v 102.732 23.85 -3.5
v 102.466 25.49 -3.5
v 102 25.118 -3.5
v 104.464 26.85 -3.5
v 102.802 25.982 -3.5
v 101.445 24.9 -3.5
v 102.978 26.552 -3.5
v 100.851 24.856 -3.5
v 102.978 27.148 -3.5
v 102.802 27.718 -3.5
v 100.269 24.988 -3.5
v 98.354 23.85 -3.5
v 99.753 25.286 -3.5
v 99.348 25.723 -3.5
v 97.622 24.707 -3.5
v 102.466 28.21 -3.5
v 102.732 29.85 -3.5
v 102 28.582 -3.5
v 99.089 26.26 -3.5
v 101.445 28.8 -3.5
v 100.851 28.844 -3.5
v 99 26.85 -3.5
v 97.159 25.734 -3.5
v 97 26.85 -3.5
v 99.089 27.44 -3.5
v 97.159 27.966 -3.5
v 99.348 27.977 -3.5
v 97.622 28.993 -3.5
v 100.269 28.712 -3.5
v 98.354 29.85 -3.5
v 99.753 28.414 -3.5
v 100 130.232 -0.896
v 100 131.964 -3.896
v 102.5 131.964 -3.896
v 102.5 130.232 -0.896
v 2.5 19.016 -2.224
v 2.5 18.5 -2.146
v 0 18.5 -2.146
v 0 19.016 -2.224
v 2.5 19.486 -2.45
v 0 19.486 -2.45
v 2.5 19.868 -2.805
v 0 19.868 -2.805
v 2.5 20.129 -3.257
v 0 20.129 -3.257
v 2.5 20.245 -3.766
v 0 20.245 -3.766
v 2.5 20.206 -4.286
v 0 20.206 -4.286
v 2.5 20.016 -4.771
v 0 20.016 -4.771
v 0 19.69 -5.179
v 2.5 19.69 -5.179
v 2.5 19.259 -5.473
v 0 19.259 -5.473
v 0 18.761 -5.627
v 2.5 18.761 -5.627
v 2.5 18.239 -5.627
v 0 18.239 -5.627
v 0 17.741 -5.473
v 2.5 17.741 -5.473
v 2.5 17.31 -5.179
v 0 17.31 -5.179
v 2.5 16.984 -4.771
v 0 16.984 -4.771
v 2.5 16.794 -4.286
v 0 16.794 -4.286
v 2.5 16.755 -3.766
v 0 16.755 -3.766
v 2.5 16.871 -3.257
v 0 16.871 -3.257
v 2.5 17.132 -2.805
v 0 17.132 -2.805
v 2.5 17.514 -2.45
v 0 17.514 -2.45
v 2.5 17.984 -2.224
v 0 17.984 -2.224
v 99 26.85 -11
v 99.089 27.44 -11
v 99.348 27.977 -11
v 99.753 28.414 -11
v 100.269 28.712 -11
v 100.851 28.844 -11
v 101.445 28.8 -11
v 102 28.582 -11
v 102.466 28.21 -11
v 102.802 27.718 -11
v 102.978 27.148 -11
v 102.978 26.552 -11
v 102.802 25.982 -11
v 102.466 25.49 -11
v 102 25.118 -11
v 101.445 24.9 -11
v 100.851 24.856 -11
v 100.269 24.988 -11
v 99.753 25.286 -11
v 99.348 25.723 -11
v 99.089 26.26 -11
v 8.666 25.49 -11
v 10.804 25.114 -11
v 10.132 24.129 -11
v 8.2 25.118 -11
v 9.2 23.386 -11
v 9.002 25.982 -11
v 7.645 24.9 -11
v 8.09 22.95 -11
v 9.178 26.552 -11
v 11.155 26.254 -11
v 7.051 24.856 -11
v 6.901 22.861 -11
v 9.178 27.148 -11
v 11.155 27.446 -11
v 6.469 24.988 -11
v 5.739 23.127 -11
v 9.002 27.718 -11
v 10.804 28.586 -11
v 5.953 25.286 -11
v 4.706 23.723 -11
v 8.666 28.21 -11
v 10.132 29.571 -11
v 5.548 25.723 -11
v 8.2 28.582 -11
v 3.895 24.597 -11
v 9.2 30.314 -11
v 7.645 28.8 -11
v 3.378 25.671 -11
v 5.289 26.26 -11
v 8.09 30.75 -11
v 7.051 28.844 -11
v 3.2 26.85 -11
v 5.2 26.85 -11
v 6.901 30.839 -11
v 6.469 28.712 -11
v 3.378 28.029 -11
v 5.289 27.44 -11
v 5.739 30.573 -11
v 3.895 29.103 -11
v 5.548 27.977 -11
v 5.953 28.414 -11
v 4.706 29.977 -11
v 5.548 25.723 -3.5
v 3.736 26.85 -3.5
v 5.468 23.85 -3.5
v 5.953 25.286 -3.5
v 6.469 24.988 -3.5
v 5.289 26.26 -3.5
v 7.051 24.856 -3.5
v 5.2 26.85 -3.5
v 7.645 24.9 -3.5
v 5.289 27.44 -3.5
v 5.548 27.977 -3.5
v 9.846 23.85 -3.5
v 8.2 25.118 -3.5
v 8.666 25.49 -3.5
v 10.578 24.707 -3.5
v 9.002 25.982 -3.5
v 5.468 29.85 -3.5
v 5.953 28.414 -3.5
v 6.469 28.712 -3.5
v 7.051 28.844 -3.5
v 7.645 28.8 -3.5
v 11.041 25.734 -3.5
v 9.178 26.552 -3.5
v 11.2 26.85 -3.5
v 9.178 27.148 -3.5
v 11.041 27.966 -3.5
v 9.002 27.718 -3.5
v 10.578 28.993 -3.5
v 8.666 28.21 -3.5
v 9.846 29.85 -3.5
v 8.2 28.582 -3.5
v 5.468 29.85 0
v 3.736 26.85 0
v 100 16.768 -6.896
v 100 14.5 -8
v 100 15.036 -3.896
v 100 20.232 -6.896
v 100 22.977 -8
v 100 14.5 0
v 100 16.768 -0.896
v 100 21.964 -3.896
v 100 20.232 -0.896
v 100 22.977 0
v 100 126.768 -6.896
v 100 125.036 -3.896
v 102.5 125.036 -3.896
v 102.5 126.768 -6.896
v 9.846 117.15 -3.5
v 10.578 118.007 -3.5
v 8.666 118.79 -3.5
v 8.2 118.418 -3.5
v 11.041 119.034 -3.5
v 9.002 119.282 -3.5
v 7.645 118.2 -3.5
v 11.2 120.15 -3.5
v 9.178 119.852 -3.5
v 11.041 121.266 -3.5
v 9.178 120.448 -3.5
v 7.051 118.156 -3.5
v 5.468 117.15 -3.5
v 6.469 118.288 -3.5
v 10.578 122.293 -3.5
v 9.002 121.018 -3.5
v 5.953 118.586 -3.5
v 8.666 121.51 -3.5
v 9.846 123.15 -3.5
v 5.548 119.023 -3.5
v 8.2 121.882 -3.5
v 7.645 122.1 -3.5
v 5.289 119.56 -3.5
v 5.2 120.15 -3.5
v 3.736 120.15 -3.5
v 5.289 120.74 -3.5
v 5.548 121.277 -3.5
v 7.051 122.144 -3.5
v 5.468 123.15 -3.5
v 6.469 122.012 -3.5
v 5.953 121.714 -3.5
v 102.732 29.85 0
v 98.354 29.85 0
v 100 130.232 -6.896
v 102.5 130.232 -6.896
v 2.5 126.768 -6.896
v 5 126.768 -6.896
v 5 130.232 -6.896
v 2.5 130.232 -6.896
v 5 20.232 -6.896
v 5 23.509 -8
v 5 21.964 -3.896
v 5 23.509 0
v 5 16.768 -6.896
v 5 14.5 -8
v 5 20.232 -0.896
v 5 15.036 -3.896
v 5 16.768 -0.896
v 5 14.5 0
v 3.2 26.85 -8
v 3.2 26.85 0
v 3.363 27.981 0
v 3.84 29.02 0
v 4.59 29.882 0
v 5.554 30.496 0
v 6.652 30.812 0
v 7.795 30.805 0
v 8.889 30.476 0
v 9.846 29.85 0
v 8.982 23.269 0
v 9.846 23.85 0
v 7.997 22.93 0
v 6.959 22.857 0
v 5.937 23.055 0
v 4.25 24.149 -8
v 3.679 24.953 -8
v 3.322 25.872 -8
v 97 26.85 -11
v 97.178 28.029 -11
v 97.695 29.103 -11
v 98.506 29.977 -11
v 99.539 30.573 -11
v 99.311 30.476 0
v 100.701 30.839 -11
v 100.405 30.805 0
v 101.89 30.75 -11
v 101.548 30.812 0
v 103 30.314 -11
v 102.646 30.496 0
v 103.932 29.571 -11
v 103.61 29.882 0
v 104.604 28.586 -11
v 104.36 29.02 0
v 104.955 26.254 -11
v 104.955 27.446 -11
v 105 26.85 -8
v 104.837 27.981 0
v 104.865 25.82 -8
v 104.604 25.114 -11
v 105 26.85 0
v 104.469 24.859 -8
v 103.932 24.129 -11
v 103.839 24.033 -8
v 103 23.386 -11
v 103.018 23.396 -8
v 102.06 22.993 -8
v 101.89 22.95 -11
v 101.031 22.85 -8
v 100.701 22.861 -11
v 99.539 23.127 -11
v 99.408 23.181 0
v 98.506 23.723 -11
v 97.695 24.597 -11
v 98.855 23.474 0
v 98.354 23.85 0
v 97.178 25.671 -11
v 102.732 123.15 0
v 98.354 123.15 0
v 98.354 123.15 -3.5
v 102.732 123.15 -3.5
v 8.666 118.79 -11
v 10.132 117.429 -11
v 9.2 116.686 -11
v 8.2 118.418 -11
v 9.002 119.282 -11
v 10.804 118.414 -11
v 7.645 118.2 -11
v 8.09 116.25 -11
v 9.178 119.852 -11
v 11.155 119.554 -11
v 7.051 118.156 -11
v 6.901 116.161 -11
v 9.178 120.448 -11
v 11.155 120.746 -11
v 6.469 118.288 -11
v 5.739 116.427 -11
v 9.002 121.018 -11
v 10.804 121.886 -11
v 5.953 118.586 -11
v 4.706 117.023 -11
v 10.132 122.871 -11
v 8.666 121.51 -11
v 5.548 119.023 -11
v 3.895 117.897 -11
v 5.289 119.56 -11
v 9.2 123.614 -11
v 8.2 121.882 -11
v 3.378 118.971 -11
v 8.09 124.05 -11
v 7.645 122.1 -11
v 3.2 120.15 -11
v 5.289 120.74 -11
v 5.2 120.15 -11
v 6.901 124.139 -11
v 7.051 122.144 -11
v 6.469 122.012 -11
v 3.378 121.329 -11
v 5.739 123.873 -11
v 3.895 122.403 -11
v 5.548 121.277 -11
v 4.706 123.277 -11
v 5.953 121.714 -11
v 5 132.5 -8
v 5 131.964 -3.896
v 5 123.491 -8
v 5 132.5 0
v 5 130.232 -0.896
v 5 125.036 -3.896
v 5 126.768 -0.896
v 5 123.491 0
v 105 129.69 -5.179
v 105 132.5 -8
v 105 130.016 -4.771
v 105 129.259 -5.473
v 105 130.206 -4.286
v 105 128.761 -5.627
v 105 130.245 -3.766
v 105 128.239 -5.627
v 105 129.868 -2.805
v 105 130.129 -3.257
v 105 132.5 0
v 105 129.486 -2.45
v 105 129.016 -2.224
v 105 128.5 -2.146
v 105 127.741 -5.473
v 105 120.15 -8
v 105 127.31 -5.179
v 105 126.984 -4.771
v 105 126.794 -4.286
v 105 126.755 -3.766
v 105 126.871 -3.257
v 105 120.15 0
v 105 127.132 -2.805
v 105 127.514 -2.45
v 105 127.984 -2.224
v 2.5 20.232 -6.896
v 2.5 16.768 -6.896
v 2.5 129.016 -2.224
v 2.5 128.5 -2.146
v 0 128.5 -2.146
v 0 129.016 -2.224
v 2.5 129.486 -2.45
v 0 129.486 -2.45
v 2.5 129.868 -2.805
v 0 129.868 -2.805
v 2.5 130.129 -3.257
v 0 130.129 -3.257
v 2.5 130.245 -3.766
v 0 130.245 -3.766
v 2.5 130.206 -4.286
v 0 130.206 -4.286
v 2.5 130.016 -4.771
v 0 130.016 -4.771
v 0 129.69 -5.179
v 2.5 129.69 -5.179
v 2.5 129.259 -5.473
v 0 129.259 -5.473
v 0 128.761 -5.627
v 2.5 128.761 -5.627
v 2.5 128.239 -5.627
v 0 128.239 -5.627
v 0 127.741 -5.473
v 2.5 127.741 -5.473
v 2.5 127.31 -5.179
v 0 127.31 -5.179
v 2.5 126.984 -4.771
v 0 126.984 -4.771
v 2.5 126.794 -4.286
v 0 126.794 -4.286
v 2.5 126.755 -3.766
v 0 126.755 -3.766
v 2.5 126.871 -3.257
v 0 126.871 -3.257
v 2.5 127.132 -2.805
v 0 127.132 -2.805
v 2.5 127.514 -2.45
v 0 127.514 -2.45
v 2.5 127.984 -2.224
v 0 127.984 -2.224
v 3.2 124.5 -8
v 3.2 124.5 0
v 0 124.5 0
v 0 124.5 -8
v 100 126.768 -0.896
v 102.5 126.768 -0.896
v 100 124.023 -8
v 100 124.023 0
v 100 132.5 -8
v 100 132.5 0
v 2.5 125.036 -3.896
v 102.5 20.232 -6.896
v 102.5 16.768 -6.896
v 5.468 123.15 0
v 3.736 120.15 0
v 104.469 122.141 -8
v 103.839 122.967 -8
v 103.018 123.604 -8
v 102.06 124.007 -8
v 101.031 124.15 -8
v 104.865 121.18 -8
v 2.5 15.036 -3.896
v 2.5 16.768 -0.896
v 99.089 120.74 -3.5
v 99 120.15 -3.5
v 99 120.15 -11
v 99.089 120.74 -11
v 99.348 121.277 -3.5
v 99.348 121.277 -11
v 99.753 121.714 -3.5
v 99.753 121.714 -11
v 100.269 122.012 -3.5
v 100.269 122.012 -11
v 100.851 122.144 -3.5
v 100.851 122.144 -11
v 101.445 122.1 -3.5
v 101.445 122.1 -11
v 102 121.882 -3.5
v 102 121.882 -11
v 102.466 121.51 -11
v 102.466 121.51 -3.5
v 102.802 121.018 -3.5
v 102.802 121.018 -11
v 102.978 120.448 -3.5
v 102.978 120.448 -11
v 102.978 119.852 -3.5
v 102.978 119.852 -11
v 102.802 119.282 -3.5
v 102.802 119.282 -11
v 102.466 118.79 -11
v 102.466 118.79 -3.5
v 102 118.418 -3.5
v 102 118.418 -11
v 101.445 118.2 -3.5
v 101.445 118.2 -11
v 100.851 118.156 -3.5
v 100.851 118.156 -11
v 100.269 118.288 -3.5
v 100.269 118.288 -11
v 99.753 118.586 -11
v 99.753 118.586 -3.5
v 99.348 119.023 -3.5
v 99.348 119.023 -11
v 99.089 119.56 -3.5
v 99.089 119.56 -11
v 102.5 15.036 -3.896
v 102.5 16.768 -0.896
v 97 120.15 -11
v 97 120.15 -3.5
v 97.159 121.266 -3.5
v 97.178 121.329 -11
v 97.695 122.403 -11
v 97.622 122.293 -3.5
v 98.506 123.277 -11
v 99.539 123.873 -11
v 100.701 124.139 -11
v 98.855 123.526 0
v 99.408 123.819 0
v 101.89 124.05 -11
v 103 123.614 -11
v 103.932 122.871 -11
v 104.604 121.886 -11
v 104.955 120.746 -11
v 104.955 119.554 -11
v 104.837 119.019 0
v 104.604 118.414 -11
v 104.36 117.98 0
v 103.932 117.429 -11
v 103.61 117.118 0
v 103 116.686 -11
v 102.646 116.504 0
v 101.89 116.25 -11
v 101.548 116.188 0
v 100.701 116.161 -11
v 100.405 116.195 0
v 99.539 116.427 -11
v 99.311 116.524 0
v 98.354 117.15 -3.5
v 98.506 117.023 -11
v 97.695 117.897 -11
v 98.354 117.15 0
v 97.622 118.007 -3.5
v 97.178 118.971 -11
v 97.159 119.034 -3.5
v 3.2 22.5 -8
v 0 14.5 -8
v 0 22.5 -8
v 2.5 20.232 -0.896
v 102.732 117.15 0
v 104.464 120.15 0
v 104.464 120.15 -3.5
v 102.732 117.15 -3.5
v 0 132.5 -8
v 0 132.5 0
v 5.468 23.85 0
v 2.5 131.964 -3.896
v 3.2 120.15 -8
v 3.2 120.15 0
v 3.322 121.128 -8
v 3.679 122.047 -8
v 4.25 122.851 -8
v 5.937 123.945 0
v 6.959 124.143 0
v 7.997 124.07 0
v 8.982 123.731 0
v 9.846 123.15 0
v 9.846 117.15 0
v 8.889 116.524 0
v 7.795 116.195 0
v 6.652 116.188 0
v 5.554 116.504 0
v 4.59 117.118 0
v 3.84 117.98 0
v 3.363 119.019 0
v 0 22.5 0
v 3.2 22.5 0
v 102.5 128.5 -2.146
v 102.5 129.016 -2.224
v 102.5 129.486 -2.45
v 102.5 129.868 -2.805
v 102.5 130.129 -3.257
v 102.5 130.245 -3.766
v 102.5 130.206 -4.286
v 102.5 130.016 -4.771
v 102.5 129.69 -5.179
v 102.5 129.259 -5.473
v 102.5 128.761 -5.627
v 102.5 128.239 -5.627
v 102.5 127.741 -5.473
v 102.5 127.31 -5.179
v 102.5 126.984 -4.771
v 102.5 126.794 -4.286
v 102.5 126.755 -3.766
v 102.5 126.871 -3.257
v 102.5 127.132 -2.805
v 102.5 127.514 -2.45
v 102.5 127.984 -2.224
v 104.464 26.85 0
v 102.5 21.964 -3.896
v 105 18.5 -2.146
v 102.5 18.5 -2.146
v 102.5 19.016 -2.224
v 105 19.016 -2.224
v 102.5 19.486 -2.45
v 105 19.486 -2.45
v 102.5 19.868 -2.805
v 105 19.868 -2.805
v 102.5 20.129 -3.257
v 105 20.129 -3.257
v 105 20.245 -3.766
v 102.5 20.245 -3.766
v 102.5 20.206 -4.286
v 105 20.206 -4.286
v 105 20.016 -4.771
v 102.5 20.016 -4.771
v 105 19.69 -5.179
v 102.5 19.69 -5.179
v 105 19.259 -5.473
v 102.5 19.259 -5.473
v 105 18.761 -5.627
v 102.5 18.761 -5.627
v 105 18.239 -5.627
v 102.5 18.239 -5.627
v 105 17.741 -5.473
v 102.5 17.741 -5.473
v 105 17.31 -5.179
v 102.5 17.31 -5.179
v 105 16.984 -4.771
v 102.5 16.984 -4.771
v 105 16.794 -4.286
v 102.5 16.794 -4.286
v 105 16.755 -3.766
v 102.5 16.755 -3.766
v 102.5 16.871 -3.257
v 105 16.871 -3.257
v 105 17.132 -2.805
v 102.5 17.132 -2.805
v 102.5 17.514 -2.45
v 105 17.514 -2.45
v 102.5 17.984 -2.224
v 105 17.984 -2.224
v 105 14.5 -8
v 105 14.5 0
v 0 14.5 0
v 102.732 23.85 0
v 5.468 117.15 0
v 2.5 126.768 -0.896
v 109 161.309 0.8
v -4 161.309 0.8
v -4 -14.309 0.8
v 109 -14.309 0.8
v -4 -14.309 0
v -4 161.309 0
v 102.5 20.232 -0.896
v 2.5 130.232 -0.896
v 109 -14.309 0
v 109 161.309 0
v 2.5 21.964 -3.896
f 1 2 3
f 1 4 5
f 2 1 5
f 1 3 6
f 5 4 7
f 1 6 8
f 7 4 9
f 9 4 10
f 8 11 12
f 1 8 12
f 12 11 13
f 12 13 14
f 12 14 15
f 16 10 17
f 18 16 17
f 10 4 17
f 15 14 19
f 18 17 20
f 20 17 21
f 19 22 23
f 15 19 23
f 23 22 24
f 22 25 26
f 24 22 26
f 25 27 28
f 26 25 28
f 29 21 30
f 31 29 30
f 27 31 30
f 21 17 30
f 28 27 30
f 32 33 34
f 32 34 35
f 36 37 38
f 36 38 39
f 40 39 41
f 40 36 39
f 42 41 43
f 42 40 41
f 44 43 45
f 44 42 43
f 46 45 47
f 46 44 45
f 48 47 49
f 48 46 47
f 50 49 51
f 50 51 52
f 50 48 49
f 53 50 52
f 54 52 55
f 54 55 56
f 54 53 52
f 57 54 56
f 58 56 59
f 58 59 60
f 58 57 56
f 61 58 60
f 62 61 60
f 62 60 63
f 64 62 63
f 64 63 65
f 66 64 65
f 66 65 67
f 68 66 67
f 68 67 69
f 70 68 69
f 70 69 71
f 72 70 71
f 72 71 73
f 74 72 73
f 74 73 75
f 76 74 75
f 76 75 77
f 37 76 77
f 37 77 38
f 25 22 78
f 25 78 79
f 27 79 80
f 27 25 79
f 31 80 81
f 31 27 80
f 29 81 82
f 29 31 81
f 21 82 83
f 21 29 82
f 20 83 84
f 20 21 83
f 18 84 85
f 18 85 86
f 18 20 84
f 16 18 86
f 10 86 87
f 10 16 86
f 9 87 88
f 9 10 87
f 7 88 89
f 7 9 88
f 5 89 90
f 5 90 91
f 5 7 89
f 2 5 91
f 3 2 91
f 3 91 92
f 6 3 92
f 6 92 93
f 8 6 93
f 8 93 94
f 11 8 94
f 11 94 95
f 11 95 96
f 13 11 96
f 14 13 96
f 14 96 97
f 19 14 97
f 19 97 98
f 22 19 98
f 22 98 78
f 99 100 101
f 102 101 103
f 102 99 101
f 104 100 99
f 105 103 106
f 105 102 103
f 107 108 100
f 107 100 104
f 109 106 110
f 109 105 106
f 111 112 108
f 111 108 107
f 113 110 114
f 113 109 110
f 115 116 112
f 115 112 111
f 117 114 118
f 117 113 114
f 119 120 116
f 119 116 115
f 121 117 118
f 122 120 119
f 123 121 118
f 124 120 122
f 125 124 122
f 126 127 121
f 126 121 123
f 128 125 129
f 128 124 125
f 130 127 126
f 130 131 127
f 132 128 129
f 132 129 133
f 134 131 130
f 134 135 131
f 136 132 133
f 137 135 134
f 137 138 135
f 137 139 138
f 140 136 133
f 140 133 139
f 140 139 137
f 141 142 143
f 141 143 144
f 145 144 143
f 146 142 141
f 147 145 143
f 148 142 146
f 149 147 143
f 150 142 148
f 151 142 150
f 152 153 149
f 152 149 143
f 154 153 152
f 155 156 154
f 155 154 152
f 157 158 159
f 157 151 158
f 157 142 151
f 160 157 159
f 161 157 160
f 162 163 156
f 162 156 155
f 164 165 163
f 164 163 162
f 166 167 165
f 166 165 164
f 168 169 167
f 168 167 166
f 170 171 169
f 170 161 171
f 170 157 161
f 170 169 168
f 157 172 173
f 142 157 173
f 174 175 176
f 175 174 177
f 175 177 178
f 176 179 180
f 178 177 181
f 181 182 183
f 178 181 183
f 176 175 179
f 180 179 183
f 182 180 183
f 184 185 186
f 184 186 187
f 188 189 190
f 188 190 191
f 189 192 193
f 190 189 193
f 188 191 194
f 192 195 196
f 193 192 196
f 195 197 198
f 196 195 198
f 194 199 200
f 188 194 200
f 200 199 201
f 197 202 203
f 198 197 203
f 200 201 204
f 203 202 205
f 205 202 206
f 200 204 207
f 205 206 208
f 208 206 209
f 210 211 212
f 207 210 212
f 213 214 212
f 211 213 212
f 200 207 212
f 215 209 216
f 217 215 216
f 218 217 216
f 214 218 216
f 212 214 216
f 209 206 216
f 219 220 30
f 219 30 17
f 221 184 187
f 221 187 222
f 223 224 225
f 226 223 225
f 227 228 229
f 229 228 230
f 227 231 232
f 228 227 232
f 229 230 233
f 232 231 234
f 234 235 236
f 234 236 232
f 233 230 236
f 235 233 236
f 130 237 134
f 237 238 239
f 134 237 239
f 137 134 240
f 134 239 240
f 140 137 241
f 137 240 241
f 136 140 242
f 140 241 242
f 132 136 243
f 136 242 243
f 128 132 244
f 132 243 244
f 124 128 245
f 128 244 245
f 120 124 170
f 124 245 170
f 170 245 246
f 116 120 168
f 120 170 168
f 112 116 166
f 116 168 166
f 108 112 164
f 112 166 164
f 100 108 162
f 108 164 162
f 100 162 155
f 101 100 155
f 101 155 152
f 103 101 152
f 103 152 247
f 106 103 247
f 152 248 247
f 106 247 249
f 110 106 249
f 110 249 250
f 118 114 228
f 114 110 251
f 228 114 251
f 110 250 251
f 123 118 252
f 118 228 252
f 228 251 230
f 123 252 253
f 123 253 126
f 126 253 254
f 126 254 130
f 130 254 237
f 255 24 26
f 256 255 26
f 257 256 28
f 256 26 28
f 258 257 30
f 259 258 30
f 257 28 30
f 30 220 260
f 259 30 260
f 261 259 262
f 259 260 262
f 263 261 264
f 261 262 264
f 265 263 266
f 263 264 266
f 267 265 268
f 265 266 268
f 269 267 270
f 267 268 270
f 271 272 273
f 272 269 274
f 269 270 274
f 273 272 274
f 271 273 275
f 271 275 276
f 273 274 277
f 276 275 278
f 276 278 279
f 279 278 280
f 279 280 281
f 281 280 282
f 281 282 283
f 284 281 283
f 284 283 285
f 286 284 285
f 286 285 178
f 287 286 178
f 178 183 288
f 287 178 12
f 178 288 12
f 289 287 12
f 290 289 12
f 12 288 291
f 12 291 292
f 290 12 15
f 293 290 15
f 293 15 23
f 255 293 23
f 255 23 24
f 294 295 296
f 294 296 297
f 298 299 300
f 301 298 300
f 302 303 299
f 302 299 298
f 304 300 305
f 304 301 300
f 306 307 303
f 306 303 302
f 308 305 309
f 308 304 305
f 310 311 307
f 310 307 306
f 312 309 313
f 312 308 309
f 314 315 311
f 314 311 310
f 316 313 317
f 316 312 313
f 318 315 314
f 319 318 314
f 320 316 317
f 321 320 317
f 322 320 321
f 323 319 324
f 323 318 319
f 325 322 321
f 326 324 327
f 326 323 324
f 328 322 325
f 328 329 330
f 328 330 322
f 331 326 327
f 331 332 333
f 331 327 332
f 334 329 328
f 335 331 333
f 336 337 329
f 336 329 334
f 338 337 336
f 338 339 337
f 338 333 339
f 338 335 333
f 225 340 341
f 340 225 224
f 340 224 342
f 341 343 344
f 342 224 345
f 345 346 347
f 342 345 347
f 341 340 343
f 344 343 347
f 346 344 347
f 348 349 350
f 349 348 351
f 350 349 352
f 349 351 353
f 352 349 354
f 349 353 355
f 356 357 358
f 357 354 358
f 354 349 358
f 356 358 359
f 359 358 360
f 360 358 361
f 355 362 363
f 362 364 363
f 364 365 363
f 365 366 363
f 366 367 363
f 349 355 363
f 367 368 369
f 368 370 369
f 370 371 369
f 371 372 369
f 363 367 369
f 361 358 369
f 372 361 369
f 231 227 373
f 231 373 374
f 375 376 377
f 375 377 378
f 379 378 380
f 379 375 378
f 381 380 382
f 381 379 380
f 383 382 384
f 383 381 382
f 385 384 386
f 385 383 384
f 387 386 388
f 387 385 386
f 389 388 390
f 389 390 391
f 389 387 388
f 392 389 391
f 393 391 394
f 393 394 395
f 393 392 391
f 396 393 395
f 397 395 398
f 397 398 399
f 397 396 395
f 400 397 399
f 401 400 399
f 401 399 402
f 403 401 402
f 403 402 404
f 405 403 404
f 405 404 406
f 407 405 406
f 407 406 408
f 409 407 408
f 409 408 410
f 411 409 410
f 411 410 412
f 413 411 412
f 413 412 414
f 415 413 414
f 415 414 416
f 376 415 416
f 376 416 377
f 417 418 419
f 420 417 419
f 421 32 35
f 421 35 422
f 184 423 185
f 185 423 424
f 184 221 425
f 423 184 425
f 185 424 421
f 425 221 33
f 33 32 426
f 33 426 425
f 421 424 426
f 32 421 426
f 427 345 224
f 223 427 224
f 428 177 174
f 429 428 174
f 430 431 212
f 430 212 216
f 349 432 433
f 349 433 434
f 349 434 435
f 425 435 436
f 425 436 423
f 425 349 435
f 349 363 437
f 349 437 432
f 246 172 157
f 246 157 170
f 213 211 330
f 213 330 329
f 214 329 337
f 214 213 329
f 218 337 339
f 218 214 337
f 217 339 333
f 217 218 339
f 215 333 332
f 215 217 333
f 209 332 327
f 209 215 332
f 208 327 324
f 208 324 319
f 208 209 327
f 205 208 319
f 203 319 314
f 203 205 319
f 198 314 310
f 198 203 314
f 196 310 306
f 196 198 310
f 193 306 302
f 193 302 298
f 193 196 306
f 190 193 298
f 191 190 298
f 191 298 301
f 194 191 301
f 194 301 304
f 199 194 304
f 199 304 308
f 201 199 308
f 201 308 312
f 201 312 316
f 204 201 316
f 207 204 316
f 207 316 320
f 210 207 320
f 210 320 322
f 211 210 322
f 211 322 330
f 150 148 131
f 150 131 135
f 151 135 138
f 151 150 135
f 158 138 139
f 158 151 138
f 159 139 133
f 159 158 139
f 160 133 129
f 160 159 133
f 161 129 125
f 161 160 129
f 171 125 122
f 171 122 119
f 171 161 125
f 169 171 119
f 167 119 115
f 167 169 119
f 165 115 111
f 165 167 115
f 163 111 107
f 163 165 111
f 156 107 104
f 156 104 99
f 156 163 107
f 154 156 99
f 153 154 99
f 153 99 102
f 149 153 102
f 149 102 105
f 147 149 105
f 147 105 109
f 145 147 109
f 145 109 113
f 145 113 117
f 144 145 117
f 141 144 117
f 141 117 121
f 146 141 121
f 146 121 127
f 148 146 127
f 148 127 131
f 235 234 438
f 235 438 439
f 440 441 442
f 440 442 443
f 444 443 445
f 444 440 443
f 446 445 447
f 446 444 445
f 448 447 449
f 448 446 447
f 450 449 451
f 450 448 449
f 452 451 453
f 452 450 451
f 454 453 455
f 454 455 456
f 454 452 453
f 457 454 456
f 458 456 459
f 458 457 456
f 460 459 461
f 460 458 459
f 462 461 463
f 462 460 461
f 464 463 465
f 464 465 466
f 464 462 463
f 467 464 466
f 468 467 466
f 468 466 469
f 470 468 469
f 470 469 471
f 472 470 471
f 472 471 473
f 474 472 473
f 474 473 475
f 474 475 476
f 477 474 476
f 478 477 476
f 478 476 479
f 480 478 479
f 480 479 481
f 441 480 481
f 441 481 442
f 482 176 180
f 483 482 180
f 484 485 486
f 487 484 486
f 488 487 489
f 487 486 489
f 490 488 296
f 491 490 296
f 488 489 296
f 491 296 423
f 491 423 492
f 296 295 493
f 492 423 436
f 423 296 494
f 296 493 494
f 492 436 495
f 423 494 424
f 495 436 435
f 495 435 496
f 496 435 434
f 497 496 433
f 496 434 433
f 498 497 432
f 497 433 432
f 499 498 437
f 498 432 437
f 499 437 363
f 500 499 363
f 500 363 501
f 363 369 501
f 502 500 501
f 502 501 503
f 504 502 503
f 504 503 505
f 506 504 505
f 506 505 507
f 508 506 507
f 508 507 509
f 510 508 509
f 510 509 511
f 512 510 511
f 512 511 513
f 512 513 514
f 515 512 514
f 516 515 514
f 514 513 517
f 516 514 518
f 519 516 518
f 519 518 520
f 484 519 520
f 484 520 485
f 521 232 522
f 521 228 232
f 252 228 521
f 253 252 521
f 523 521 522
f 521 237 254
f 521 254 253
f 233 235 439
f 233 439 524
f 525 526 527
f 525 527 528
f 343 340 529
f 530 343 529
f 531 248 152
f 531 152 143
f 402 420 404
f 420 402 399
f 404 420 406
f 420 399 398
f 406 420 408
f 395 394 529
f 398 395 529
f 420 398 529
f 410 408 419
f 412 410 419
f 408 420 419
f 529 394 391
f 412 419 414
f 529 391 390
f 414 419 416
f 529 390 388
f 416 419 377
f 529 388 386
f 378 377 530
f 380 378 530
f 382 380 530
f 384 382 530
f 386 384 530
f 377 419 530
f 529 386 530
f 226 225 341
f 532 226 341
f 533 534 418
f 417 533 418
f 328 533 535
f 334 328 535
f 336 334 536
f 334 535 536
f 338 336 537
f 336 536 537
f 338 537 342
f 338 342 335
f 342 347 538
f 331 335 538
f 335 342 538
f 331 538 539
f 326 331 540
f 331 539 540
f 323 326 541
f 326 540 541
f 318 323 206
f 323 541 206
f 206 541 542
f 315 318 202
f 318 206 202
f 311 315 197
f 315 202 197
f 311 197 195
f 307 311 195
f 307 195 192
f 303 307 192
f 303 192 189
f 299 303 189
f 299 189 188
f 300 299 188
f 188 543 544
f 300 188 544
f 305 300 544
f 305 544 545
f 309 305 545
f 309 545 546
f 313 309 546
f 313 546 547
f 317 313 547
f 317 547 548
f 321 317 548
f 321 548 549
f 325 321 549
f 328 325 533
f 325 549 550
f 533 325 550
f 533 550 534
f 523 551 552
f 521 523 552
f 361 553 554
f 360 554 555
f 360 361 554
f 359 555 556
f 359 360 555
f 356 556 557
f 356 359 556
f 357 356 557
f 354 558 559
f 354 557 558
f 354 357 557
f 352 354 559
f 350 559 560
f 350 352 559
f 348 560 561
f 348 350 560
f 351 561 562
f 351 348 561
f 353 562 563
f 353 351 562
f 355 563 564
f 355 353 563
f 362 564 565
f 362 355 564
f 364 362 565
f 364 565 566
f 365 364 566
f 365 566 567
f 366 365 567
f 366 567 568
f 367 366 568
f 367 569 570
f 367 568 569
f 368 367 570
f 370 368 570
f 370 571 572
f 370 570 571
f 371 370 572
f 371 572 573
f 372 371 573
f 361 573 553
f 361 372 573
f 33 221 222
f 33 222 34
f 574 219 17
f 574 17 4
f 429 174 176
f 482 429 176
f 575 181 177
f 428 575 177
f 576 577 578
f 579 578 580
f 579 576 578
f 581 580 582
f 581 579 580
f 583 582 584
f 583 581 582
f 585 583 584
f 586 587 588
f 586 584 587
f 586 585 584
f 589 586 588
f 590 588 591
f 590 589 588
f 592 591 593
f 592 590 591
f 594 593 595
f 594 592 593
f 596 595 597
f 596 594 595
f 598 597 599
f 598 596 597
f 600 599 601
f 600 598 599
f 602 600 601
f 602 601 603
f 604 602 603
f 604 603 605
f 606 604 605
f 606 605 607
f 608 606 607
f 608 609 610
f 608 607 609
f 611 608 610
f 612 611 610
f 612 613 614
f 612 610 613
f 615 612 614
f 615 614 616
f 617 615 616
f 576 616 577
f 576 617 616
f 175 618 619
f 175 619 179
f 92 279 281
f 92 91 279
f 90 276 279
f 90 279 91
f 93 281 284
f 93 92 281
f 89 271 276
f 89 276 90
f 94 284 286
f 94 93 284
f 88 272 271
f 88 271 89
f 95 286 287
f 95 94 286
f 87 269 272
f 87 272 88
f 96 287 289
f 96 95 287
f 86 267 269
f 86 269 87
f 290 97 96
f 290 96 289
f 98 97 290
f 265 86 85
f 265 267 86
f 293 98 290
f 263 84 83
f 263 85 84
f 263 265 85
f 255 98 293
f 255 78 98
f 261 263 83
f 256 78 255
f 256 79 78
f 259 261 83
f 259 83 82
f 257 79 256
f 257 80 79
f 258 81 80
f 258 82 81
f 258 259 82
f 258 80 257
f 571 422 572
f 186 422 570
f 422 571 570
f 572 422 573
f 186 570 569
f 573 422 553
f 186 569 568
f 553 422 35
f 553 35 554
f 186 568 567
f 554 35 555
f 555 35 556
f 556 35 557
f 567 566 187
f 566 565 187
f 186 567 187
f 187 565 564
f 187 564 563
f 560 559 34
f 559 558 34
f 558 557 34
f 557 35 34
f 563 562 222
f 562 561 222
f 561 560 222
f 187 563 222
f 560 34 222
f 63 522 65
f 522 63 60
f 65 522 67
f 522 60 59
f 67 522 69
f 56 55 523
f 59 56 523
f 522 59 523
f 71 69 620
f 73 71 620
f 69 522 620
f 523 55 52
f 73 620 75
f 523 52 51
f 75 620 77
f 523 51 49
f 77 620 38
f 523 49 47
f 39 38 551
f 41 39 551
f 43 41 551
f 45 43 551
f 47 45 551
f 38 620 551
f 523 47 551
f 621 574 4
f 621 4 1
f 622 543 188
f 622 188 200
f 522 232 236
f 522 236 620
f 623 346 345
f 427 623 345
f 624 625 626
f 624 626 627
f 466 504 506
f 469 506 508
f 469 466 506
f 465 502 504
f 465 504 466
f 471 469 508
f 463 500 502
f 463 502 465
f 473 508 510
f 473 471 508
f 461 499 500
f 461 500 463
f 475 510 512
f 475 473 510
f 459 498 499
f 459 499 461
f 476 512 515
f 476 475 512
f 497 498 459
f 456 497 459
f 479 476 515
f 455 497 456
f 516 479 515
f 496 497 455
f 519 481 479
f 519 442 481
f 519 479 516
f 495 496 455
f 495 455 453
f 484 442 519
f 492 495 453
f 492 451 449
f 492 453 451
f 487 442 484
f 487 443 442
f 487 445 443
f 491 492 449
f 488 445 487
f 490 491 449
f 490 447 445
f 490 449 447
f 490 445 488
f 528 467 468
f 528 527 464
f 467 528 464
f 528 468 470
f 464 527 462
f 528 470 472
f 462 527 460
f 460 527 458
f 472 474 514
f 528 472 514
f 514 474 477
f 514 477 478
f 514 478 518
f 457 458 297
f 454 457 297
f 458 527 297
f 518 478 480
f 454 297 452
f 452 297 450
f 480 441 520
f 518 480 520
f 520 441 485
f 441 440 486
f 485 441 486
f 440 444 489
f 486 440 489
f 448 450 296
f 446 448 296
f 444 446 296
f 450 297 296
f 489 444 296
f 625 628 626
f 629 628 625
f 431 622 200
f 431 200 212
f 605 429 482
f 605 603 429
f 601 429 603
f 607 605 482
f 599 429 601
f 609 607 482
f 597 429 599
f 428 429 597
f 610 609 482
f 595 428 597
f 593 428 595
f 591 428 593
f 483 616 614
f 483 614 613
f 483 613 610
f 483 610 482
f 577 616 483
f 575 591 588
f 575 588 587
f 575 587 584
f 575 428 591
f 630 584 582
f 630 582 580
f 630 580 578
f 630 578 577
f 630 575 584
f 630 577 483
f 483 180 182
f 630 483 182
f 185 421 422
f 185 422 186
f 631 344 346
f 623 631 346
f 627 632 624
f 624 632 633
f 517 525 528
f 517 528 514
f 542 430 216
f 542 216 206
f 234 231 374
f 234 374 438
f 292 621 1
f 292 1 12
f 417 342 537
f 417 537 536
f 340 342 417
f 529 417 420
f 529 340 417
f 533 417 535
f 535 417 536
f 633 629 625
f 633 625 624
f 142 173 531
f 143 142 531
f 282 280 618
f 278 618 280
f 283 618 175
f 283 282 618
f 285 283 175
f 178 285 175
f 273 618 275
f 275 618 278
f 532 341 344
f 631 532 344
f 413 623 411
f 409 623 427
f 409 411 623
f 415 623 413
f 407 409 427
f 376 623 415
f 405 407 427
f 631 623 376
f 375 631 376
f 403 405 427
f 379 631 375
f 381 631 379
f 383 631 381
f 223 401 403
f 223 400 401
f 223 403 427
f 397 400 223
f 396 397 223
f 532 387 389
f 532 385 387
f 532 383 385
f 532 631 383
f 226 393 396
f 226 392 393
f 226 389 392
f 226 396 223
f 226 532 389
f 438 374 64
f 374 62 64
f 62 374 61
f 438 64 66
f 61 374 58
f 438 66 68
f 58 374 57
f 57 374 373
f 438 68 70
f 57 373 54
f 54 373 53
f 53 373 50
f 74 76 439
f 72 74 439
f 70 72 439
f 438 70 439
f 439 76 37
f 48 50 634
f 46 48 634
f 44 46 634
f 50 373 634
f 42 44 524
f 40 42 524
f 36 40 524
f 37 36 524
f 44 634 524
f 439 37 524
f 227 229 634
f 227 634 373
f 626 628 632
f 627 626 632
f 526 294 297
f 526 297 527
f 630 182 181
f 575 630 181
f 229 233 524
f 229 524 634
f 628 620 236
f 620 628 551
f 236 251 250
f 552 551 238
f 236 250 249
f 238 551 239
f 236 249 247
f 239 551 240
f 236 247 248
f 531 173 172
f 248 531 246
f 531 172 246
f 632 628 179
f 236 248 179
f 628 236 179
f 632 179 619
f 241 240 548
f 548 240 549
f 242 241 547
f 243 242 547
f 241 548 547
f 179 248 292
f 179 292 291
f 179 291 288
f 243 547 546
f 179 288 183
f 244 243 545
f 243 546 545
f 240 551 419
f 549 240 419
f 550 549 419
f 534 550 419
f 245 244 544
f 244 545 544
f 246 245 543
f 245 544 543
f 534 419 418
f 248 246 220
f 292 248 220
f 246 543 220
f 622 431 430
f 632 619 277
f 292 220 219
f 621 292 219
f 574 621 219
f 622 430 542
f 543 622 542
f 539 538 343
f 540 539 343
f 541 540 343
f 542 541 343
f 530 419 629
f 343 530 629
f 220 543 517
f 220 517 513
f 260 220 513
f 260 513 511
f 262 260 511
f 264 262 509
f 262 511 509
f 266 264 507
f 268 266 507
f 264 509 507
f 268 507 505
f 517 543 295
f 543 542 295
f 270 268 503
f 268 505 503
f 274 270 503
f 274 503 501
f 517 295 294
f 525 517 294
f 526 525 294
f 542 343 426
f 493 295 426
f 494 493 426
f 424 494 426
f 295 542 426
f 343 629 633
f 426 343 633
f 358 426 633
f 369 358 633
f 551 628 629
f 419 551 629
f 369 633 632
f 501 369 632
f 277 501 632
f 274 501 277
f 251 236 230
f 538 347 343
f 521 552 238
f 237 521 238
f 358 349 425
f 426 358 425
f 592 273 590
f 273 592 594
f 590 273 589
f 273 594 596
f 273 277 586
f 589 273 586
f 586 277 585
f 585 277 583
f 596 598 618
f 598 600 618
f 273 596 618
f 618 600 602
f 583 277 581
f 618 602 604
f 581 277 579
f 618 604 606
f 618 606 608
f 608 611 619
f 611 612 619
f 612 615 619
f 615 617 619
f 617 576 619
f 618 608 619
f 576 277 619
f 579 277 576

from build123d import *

# Parameters (mm, degrees)
SKETCH1_W           = 113
SKETCH1_H           = 175.618176042
BOSS_EXTRUDE1_DEPTH = 0.8
SKETCH2_R           = 4
SKETCH2_R_2         = 2
BOSS_EXTRUDE2_DEPTH = 11
CUT_EXTRUDE1_DEPTH  = 3.5
SKETCH4_W           = 5
SKETCH4_H           = 8
BOSS_EXTRUDE3_DEPTH = 8
SKETCH5_R           = 1.75
CUT_EXTRUDE2_DEPTH  = 105
CUT_EXTRUDE3_DEPTH  = 2.5


with BuildPart() as part:
    # Sketch1 → Boss-Extrude1 (new body)
    with BuildSketch(Plane.XY):
        with Locations((52.5, 73.5)):
            Rectangle(SKETCH1_W, SKETCH1_H)
    extrude(amount=BOSS_EXTRUDE1_DEPTH)

    # Sketch2 → Boss-Extrude2 (add)
    with BuildSketch(Plane(origin=(0, 0, 0), x_dir=(-1, 0, 0), z_dir=(0, 0, -1))):
        with Locations((-7.2, 120.15)):
            Circle(SKETCH2_R)
        with Locations((-7.2, 120.15)):
            Circle(SKETCH2_R_2, mode=Mode.SUBTRACT)
        with Locations((-7.2, 26.85)):
            Circle(SKETCH2_R)
        with Locations((-7.2, 26.85)):
            Circle(SKETCH2_R_2, mode=Mode.SUBTRACT)
        with Locations((-101, 26.85)):
            Circle(SKETCH2_R)
        with Locations((-101, 26.85)):
            Circle(SKETCH2_R_2, mode=Mode.SUBTRACT)
        with Locations((-101, 120.15)):
            Circle(SKETCH2_R)
        with Locations((-101, 120.15)):
            Circle(SKETCH2_R_2, mode=Mode.SUBTRACT)
    extrude(amount=BOSS_EXTRUDE2_DEPTH)

    # Sketch3 → Cut-Extrude1 (cut)
    with BuildSketch(Plane(origin=(0, 0, 0), x_dir=(-1, 0, 0), z_dir=(0, 0, -1))):
        Polygon((-5.467949192, 123.15), (-8.932050808, 123.15), (-10.664101615, 120.15), (-8.932050808, 117.15), (-5.467949192, 117.15), (-3.735898385, 120.15), align=None)
        with BuildLine():
            Line((-10.664101615, 120.15), (-8.932050808, 123.15))
            Line((-8.932050808, 123.15), (-9.845751311, 123.15))
            ThreePointArc((-9.845751311, 123.15), (-11.2, 120.15), (-9.845751311, 117.15))
            Line((-9.845751311, 117.15), (-8.932050808, 117.15))
            Line((-8.932050808, 117.15), (-10.664101615, 120.15))
        make_face()
        Polygon((-102.732050808, 117.15), (-99.267949192, 117.15), (-97.535898385, 120.15), (-99.267949192, 123.15), (-102.732050808, 123.15), (-104.464101615, 120.15), align=None)
        with BuildLine():
            Line((-98.354248689, 123.15), (-99.267949192, 123.15))
            Line((-99.267949192, 123.15), (-97.535898385, 120.15))
            Line((-97.535898385, 120.15), (-99.267949192, 117.15))
            Line((-99.267949192, 117.15), (-98.354248689, 117.15))
            ThreePointArc((-98.354248689, 117.15), (-97.354248689, 118.504248689), (-97, 120.15))
            ThreePointArc((-97, 120.15), (-97.354248689, 121.795751311), (-98.354248689, 123.15))
        make_face()
        with BuildLine():
            Line((-99.267949192, 29.85), (-97.535898385, 26.85))
            Line((-97.535898385, 26.85), (-99.267949192, 23.85))
            Line((-99.267949192, 23.85), (-98.354248689, 23.85))
            ThreePointArc((-98.354248689, 23.85), (-97.354248689, 25.204248689), (-97, 26.85))
            ThreePointArc((-97, 26.85), (-97.354248689, 28.495751311), (-98.354248689, 29.85))
            Line((-98.354248689, 29.85), (-99.267949192, 29.85))
        make_face()
        Polygon((-102.732050808, 23.85), (-99.267949192, 23.85), (-97.535898385, 26.85), (-99.267949192, 29.85), (-102.732050808, 29.85), (-104.464101615, 26.85), align=None)
        Polygon((-5.467949192, 23.85), (-8.932050808, 23.85), (-10.664101615, 26.85), (-8.932050808, 29.85), (-5.467949192, 29.85), (-3.735898385, 26.85), align=None)
        with BuildLine():
            Line((-10.664101615, 26.85), (-8.932050808, 29.85))
            Line((-8.932050808, 29.85), (-9.845751311, 29.85))
            ThreePointArc((-9.845751311, 29.85), (-11.2, 26.85), (-9.845751311, 23.85))
            Line((-9.845751311, 23.85), (-8.932050808, 23.85))
            Line((-8.932050808, 23.85), (-10.664101615, 26.85))
        make_face()
    extrude(amount=CUT_EXTRUDE1_DEPTH, mode=Mode.SUBTRACT)

    # Sketch4 → Boss-Extrude3 (add)
    with BuildSketch(Plane(origin=(0, 0, 0), x_dir=(-1, 0, 0), z_dir=(0, 0, -1))):
        with Locations((-102.5, 18.5)):
            Rectangle(SKETCH4_W, SKETCH4_H)
        with BuildLine():
            Line((-105, 26.85), (-105, 22.5))
            Line((-105, 22.5), (-100, 22.5))
            Line((-100, 22.5), (-100, 22.977016654))
            ThreePointArc((-100, 22.977016654), (-103.449489743, 23.68772234), (-105, 26.85))
        make_face()
        with BuildLine():
            Line((-105, 124.5), (-105, 120.15))
            ThreePointArc((-105, 120.15), (-103.449489743, 123.31227766), (-100, 124.022983346))
            Line((-100, 124.022983346), (-100, 124.5))
            Line((-100, 124.5), (-105, 124.5))
        make_face()
        with Locations((-102.5, 128.5)):
            Rectangle(SKETCH4_W, SKETCH4_H)
        with BuildLine():
            Line((-3.2, 120.15), (-3.2, 124.5))
            Line((-3.2, 124.5), (-5, 124.5))
            Line((-5, 124.5), (-5, 123.490658618))
            ThreePointArc((-5, 123.490658618), (-3.678636628, 122.047366596), (-3.2, 120.15))
        make_face()
        with Locations((-2.5, 128.5)):
            Rectangle(SKETCH4_W, SKETCH4_H)
        Polygon((-5, 14.5), (0, 14.5), (0, 22.5), (-3.2, 22.5), (-5, 22.5), align=None)
        with BuildLine():
            Line((-5, 23.509341382), (-5, 22.5))
            Line((-5, 22.5), (-3.2, 22.5))
            Line((-3.2, 22.5), (-3.2, 26.85))
            ThreePointArc((-3.2, 26.85), (-3.678636628, 24.952633404), (-5, 23.509341382))
        make_face()
    extrude(amount=BOSS_EXTRUDE3_DEPTH)

    # Sketch5 → Cut-Extrude2 (cut)
    with BuildSketch(Plane.ZY.offset(-105)):
        with Locations((-3.896353455, 128.5)):
            Circle(SKETCH5_R)
        with Locations((-3.896353455, 18.5)):
            Circle(SKETCH5_R)
    extrude(amount=CUT_EXTRUDE2_DEPTH, mode=Mode.SUBTRACT)

    # Sketch6 → Cut-Extrude3 (cut)
    with BuildSketch(Plane.ZY.offset(-100)):
        Polygon((-3.896353455, 21.964101615), (-6.896353455, 20.232050808), (-6.896353455, 16.767949192), (-3.896353455, 15.035898385), (-0.896353455, 16.767949192), (-0.896353455, 20.232050808), align=None)
        Polygon((-0.896353455, 130.232050808), (-0.896353455, 126.767949192), (-3.896353455, 125.035898385), (-6.896353455, 126.767949192), (-6.896353455, 130.232050808), (-3.896353455, 131.964101615), align=None)
    cut_extrude3 = extrude(amount=-CUT_EXTRUDE3_DEPTH, mode=Mode.SUBTRACT)

    # Mirror1: Cut-Extrude3 across plane
    add(cut_extrude3.mirror(Plane.ZY.offset(-52.5)), mode=Mode.SUBTRACT)


solid = part.part
